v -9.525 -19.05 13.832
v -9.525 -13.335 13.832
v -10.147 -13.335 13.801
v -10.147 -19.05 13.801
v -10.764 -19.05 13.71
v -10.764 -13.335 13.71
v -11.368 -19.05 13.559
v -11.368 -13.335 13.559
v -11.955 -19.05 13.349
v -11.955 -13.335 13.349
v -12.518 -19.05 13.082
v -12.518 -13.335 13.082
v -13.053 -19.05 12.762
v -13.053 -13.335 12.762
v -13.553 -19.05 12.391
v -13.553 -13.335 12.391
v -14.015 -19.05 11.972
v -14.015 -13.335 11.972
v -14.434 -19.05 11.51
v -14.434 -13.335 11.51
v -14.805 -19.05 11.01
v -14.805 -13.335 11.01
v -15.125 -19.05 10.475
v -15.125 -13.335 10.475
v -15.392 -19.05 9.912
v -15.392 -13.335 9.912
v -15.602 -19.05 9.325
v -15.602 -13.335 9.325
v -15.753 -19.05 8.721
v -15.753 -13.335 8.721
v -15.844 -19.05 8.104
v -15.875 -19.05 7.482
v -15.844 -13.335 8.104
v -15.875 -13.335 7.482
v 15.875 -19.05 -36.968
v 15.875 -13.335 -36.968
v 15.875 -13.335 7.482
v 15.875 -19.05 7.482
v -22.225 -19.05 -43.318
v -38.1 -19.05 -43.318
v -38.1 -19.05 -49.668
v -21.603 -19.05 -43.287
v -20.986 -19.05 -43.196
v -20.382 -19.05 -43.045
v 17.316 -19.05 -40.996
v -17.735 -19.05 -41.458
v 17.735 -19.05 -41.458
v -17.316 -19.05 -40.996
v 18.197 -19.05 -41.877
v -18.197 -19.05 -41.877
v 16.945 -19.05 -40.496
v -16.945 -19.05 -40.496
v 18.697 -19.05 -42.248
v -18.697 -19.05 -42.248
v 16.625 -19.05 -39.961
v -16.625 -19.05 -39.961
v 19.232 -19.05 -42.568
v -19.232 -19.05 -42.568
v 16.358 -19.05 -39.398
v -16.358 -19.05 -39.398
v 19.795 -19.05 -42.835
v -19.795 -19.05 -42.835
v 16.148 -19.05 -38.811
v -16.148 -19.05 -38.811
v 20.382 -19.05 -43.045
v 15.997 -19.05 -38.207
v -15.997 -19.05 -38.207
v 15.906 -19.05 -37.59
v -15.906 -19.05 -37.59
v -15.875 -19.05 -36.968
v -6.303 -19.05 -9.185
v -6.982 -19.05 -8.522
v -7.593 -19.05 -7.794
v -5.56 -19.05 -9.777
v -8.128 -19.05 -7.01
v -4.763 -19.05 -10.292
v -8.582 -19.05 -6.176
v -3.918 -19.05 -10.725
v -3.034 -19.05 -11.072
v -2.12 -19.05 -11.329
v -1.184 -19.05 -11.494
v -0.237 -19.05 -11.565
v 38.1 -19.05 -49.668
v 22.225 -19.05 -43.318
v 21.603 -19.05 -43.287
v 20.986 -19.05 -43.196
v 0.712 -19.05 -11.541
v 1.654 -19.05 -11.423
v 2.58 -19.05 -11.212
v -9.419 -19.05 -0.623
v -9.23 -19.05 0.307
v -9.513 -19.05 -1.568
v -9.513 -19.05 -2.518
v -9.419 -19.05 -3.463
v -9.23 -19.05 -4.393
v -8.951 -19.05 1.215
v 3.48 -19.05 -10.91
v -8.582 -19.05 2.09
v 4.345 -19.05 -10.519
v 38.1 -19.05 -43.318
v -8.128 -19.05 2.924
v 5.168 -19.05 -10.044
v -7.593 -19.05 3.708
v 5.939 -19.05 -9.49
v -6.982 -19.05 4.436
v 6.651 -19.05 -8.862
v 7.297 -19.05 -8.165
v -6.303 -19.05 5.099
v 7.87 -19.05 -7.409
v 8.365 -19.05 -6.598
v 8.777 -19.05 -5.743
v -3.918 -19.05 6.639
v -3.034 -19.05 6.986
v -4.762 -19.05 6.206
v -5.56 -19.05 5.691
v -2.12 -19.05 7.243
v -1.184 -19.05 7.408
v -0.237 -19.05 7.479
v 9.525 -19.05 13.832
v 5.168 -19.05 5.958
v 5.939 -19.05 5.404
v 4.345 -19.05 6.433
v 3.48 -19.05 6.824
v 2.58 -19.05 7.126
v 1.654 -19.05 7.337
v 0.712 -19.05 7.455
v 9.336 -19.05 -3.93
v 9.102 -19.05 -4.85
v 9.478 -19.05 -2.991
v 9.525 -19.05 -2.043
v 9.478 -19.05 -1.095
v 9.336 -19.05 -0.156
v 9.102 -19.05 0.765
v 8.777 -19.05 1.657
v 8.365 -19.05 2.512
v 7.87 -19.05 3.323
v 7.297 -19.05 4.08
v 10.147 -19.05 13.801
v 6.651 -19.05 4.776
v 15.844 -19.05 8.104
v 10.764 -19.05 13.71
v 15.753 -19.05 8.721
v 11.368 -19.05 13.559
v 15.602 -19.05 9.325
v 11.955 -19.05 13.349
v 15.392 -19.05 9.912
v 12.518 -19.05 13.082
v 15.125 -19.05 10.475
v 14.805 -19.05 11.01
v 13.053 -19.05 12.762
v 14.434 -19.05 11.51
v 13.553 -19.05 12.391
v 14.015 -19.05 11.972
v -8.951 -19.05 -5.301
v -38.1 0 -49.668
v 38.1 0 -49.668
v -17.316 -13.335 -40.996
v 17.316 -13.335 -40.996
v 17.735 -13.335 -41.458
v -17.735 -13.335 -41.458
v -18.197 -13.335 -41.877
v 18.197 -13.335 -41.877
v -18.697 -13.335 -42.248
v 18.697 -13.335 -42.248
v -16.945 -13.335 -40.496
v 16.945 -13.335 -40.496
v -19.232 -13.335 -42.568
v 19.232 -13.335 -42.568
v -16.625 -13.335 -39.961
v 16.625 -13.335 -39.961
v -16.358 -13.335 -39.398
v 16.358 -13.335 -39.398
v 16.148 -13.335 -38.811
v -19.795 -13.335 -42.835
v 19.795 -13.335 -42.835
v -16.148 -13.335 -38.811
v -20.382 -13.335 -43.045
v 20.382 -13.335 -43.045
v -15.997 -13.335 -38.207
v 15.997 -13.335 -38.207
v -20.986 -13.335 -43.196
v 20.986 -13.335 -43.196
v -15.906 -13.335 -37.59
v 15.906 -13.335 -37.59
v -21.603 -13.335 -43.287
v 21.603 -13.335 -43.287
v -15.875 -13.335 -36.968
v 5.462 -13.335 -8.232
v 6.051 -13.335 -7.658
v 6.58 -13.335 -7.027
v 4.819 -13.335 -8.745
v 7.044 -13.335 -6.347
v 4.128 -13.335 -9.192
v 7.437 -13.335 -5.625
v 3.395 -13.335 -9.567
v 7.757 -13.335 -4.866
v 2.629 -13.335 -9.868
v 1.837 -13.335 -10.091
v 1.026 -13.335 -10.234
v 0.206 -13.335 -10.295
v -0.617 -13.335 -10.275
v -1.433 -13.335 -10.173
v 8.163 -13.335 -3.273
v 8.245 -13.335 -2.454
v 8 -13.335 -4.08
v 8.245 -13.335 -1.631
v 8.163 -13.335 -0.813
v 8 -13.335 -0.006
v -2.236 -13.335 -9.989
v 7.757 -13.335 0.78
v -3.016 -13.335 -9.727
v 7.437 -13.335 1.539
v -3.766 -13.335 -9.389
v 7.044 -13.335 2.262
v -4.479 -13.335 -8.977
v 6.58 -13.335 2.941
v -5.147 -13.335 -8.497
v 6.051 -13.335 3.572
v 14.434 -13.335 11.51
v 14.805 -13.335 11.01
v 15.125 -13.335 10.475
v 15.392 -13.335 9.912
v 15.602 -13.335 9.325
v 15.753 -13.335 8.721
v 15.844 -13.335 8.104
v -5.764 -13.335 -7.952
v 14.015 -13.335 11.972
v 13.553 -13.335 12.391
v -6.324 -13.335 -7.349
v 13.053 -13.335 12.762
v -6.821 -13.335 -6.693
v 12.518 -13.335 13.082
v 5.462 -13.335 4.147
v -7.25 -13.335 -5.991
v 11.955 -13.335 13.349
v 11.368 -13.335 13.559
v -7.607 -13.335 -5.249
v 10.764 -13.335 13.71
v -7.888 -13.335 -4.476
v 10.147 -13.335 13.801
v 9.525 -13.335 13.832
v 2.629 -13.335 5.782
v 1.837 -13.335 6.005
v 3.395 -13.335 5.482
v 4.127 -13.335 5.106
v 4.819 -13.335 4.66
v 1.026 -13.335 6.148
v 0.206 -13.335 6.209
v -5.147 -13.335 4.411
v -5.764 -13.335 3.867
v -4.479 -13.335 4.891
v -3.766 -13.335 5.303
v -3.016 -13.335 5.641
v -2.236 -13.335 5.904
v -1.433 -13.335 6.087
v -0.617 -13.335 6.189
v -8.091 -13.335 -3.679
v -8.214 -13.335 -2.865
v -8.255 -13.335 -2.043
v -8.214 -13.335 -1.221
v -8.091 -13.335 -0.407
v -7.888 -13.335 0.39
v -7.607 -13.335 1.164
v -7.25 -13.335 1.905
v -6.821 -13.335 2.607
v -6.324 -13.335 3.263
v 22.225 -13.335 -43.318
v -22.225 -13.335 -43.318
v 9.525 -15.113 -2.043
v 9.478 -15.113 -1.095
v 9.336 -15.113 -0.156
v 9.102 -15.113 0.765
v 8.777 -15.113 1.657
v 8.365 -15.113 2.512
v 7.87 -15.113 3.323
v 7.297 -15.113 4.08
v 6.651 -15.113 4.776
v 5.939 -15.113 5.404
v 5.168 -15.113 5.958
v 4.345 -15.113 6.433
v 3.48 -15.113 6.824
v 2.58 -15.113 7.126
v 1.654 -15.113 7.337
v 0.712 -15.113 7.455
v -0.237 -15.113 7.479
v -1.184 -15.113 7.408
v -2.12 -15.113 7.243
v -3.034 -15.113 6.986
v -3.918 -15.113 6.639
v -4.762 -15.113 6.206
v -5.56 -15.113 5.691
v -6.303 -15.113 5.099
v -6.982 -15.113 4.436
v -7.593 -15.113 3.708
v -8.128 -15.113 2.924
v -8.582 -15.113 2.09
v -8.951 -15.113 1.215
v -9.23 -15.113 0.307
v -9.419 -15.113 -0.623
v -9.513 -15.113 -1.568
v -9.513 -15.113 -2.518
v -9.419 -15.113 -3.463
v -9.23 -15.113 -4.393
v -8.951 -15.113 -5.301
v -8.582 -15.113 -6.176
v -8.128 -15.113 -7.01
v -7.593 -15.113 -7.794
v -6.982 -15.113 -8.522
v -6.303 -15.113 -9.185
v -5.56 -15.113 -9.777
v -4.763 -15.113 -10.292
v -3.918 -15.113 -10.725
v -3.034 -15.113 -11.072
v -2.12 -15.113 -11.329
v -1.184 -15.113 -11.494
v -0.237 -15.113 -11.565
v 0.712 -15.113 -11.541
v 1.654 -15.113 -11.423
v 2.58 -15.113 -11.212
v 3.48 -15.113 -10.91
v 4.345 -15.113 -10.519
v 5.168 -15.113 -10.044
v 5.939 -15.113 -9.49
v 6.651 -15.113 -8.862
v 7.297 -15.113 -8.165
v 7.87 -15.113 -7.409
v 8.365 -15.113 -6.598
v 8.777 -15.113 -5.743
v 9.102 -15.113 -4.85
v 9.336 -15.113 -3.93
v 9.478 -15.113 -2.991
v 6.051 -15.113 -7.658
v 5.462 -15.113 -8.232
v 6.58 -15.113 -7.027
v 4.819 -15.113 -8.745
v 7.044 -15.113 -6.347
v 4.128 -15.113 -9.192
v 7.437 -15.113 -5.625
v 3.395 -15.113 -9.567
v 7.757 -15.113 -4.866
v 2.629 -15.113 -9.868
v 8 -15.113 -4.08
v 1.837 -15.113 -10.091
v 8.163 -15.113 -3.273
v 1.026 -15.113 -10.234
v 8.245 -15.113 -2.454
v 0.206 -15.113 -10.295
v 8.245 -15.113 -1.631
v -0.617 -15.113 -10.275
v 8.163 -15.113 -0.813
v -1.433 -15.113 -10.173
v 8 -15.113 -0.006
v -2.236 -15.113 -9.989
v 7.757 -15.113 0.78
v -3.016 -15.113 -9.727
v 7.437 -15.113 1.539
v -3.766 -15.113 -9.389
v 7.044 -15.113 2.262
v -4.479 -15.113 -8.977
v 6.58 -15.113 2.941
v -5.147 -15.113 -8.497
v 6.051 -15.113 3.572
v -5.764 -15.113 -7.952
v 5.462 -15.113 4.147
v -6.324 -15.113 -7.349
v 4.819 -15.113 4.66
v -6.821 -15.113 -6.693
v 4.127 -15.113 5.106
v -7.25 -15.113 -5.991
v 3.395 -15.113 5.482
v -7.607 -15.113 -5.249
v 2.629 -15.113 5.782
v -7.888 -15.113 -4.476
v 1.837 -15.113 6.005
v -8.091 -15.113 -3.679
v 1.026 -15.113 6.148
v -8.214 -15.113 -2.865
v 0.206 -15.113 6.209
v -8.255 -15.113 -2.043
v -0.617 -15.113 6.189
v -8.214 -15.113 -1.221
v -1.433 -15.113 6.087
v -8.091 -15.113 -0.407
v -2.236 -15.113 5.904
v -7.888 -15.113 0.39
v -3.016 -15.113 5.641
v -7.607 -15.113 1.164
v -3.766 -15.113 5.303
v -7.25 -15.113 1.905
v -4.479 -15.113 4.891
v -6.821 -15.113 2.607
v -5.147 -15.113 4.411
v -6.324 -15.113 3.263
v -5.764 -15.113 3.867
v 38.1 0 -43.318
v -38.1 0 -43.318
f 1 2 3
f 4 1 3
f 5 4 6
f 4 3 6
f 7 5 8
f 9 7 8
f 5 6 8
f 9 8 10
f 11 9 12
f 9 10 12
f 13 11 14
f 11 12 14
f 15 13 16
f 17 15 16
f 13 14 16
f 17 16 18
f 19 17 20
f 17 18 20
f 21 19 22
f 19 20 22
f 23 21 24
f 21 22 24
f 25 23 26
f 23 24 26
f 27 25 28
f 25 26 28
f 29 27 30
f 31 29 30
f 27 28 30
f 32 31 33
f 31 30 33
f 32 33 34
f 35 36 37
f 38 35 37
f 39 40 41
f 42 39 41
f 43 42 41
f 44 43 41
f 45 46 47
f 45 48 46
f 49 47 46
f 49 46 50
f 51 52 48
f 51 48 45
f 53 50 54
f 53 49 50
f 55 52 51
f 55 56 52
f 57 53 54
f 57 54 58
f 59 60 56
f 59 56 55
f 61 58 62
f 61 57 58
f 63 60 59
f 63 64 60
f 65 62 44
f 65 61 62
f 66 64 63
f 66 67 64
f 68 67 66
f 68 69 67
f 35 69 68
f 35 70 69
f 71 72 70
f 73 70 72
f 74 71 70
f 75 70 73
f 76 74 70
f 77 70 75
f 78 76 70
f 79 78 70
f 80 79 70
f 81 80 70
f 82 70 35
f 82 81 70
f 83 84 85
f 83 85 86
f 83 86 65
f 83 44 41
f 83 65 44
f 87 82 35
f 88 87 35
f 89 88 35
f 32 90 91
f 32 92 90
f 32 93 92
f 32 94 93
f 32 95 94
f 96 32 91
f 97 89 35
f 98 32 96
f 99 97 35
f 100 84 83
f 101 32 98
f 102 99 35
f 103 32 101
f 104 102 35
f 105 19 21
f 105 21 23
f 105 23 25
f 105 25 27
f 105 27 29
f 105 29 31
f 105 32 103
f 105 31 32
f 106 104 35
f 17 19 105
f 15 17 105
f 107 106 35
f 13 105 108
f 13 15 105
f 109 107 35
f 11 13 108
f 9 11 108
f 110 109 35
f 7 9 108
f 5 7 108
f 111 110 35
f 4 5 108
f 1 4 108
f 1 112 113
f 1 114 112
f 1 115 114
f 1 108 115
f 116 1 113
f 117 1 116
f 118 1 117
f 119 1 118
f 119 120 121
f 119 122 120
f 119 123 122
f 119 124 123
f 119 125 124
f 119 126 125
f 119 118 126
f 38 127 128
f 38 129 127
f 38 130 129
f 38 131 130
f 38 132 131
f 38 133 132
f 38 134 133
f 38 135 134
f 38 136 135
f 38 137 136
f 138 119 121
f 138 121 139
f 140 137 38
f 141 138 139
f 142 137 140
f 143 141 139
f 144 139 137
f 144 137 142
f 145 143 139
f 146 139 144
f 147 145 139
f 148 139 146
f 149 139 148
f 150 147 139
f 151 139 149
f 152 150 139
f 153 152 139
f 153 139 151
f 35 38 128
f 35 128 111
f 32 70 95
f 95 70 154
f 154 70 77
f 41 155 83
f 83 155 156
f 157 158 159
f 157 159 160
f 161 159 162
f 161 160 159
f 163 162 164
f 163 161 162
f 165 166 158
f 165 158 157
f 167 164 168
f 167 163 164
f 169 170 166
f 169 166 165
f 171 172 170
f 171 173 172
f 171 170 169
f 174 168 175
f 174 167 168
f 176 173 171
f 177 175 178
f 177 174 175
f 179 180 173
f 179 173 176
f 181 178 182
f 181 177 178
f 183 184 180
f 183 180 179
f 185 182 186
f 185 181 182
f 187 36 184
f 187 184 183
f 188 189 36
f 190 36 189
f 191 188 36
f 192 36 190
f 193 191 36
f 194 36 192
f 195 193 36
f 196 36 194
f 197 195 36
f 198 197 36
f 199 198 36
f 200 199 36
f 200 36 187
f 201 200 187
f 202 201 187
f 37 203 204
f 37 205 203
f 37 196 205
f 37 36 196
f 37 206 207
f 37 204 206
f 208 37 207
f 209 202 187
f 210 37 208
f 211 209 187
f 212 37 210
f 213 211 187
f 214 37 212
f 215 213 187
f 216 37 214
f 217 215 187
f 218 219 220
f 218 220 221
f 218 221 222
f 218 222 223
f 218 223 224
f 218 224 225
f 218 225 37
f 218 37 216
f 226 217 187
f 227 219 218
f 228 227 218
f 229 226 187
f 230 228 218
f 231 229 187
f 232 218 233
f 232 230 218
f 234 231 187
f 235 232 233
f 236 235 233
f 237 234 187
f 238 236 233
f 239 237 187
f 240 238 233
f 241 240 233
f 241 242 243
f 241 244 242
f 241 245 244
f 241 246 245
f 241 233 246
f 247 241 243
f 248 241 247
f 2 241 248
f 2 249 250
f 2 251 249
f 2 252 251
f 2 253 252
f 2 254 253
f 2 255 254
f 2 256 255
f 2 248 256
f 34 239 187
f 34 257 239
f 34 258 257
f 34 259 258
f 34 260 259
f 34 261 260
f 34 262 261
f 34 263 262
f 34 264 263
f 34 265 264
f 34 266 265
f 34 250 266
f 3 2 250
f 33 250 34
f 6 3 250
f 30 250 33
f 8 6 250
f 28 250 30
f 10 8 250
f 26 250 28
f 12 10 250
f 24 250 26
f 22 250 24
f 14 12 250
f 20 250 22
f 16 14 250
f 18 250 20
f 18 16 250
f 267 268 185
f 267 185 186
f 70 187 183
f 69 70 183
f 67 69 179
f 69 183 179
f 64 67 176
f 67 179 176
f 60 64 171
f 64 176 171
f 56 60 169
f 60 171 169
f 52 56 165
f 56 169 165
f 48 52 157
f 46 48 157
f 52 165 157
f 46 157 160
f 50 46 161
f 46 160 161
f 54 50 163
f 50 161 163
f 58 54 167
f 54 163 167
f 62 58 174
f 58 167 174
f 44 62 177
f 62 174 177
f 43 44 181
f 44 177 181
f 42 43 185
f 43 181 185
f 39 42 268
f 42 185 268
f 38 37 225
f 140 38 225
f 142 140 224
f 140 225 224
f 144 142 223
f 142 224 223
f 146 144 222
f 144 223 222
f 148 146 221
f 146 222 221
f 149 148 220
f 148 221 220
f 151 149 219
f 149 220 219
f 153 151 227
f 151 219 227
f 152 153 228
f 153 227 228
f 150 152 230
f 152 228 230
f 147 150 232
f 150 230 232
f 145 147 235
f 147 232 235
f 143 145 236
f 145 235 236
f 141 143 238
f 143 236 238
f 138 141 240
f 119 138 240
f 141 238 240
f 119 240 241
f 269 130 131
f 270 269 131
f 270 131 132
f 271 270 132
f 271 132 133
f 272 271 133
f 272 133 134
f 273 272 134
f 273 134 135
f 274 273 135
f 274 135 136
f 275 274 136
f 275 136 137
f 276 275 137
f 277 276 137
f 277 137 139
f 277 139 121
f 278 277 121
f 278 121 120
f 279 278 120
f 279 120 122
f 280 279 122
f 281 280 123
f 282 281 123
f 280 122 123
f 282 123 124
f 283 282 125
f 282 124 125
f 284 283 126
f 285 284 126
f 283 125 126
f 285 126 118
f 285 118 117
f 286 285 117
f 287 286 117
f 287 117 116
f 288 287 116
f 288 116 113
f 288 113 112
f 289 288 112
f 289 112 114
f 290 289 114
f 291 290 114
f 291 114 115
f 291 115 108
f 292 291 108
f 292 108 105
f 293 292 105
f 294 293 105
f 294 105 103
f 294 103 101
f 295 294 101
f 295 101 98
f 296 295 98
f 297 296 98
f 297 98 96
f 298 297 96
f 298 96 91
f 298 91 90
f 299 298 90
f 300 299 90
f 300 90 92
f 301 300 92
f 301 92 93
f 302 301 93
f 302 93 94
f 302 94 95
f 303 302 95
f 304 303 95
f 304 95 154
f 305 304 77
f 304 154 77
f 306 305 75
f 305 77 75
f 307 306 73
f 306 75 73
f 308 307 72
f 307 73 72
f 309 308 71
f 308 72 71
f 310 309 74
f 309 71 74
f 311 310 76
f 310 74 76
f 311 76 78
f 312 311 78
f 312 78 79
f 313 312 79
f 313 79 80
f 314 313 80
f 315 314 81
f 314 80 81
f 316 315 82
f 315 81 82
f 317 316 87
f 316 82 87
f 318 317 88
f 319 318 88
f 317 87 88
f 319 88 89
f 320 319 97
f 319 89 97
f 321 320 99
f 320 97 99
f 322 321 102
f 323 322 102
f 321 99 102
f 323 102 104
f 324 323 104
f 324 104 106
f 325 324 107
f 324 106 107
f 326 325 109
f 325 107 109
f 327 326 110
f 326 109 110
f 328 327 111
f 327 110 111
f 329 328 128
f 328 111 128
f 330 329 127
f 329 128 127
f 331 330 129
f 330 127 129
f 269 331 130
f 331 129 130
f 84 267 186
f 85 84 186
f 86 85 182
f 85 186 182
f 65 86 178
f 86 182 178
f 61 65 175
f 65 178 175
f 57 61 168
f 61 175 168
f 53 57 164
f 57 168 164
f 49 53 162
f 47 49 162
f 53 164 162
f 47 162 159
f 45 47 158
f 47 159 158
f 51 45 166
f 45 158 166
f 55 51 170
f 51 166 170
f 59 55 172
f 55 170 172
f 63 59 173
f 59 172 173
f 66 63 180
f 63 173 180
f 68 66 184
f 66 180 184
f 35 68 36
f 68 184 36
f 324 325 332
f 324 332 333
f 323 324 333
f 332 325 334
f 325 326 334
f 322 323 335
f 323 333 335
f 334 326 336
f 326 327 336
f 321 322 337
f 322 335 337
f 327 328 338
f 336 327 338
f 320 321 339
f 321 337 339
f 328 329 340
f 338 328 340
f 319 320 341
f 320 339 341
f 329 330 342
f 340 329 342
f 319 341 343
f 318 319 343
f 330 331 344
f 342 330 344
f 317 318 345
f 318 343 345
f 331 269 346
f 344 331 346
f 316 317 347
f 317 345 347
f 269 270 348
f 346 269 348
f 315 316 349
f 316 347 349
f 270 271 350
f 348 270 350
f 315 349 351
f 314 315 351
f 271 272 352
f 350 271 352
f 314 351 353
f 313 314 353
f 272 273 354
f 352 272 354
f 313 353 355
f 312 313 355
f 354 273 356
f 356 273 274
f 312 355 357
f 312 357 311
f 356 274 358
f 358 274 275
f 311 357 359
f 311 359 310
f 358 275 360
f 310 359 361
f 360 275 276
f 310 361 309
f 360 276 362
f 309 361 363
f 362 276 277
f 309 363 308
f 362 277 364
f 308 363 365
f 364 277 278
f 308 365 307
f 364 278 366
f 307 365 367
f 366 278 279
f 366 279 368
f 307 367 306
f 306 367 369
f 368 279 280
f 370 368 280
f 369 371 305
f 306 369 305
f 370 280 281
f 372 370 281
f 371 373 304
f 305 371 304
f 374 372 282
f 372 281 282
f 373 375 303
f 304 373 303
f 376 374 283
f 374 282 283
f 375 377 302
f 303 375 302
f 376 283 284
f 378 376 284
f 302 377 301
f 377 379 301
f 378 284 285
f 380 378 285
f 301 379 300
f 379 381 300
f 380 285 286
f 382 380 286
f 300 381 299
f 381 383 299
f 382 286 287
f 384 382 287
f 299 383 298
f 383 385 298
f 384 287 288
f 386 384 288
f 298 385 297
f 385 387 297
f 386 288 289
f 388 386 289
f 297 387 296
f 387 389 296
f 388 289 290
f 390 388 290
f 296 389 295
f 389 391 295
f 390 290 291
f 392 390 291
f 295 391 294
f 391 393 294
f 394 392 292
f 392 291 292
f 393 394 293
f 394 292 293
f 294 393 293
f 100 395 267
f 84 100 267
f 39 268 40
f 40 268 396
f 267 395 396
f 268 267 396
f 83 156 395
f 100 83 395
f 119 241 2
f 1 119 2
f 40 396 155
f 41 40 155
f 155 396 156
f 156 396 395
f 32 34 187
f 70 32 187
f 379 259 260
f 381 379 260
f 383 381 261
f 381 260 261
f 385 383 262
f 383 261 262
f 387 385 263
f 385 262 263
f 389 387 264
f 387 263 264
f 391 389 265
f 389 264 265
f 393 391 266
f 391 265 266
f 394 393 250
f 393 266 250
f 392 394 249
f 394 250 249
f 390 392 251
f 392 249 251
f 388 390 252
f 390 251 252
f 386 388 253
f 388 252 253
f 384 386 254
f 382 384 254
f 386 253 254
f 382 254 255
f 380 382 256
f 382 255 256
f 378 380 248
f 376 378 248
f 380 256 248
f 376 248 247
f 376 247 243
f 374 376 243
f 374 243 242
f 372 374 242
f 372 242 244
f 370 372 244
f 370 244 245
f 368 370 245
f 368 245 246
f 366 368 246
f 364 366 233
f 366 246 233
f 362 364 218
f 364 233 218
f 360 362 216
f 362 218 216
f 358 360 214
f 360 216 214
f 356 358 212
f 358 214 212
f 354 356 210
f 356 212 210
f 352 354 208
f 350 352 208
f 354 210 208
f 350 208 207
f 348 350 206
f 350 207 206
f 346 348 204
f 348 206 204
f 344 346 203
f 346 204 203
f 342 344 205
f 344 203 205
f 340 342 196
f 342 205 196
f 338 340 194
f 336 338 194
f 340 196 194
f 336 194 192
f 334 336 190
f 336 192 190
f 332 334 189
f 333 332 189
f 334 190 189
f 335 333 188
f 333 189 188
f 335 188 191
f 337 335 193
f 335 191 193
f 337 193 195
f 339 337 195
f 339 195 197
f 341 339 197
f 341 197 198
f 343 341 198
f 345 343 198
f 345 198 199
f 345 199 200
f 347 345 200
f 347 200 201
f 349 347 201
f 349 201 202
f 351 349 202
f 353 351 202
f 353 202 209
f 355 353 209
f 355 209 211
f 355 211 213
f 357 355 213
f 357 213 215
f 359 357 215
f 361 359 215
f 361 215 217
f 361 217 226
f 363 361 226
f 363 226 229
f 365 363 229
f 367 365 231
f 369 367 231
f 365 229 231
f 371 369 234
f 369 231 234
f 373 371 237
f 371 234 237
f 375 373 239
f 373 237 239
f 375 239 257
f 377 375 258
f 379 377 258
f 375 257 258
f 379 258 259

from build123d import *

# Parameters (mm, degrees)
F1_DEPTH      = 19.05
F2_W          = 26.162
F2_H          = 57.15
F3_DEPTH      = 38.101
F3_DEPTH_BACK = 38.101
F4_R          = 9.525
F5_DEPTH      = 19.051
F6_R          = 9.525
F6_R_2        = 8.255
F7_DEPTH      = 1.778


with BuildPart() as f1:
    # F0 (on Front) → F1 (new body)
    with BuildSketch(Plane.XZ):
        with BuildLine():
            Line((-38.1, -43.3179386414), (-38.1, -49.6679386414))
            Line((-38.1, -49.6679386414), (38.1, -49.6679386414))
            Line((38.1, -49.6679386414), (38.1, -43.3179386414))
            Line((38.1, -43.3179386414), (22.225, -43.3179386414))
            ThreePointArc((22.225, -43.3179386414), (17.7348719395, -41.458066702), (15.875, -36.9679386414))
            Line((15.875, -36.9679386414), (15.875, 7.4820613586))
            ThreePointArc((15.875, 7.4820613586), (14.0151280605, 11.9721894191), (9.525, 13.8320613586))
            Line((9.525, 13.8320613586), (-9.525, 13.8320613586))
            ThreePointArc((-9.525, 13.8320613586), (-14.0151280605, 11.9721894191), (-15.875, 7.4820613586))
            Line((-15.875, 7.4820613586), (-15.875, -36.9679386414))
            ThreePointArc((-15.875, -36.9679386414), (-17.7348719395, -41.458066702), (-22.225, -43.3179386414))
            Line((-22.225, -43.3179386414), (-38.1, -43.3179386414))
        make_face()
    extrude(amount=F1_DEPTH)

    # F2 (on Right) → F3 (cut, two sides)
    with BuildSketch(Plane.YZ) as f3_sk:
        with Locations((-0.254, -14.7429386414)):
            Rectangle(F2_W, F2_H)
    extrude(amount=-F3_DEPTH, mode=Mode.SUBTRACT)
    extrude(f3_sk.sketch, amount=F3_DEPTH_BACK, mode=Mode.SUBTRACT)

    # F4 (on face) → F5 (cut, through all)
    with BuildSketch(Plane.XZ.offset(19.05)):
        with Locations((0, -2.0429386414)):
            Circle(F4_R)
    extrude(amount=-F5_DEPTH, mode=Mode.SUBTRACT)

    # F6 (on face) → F7 (join)
    with BuildSketch(Plane(origin=(0, -13.335, 0), x_dir=(-1, 0, 0), z_dir=(0, 1, 0))):
        with Locations((0, -2.0429386414)):
            Circle(F6_R)
        with Locations((0, -2.0429386414)):
            Circle(F6_R_2, mode=Mode.SUBTRACT)
    extrude(amount=-F7_DEPTH)


solid = f1.part
